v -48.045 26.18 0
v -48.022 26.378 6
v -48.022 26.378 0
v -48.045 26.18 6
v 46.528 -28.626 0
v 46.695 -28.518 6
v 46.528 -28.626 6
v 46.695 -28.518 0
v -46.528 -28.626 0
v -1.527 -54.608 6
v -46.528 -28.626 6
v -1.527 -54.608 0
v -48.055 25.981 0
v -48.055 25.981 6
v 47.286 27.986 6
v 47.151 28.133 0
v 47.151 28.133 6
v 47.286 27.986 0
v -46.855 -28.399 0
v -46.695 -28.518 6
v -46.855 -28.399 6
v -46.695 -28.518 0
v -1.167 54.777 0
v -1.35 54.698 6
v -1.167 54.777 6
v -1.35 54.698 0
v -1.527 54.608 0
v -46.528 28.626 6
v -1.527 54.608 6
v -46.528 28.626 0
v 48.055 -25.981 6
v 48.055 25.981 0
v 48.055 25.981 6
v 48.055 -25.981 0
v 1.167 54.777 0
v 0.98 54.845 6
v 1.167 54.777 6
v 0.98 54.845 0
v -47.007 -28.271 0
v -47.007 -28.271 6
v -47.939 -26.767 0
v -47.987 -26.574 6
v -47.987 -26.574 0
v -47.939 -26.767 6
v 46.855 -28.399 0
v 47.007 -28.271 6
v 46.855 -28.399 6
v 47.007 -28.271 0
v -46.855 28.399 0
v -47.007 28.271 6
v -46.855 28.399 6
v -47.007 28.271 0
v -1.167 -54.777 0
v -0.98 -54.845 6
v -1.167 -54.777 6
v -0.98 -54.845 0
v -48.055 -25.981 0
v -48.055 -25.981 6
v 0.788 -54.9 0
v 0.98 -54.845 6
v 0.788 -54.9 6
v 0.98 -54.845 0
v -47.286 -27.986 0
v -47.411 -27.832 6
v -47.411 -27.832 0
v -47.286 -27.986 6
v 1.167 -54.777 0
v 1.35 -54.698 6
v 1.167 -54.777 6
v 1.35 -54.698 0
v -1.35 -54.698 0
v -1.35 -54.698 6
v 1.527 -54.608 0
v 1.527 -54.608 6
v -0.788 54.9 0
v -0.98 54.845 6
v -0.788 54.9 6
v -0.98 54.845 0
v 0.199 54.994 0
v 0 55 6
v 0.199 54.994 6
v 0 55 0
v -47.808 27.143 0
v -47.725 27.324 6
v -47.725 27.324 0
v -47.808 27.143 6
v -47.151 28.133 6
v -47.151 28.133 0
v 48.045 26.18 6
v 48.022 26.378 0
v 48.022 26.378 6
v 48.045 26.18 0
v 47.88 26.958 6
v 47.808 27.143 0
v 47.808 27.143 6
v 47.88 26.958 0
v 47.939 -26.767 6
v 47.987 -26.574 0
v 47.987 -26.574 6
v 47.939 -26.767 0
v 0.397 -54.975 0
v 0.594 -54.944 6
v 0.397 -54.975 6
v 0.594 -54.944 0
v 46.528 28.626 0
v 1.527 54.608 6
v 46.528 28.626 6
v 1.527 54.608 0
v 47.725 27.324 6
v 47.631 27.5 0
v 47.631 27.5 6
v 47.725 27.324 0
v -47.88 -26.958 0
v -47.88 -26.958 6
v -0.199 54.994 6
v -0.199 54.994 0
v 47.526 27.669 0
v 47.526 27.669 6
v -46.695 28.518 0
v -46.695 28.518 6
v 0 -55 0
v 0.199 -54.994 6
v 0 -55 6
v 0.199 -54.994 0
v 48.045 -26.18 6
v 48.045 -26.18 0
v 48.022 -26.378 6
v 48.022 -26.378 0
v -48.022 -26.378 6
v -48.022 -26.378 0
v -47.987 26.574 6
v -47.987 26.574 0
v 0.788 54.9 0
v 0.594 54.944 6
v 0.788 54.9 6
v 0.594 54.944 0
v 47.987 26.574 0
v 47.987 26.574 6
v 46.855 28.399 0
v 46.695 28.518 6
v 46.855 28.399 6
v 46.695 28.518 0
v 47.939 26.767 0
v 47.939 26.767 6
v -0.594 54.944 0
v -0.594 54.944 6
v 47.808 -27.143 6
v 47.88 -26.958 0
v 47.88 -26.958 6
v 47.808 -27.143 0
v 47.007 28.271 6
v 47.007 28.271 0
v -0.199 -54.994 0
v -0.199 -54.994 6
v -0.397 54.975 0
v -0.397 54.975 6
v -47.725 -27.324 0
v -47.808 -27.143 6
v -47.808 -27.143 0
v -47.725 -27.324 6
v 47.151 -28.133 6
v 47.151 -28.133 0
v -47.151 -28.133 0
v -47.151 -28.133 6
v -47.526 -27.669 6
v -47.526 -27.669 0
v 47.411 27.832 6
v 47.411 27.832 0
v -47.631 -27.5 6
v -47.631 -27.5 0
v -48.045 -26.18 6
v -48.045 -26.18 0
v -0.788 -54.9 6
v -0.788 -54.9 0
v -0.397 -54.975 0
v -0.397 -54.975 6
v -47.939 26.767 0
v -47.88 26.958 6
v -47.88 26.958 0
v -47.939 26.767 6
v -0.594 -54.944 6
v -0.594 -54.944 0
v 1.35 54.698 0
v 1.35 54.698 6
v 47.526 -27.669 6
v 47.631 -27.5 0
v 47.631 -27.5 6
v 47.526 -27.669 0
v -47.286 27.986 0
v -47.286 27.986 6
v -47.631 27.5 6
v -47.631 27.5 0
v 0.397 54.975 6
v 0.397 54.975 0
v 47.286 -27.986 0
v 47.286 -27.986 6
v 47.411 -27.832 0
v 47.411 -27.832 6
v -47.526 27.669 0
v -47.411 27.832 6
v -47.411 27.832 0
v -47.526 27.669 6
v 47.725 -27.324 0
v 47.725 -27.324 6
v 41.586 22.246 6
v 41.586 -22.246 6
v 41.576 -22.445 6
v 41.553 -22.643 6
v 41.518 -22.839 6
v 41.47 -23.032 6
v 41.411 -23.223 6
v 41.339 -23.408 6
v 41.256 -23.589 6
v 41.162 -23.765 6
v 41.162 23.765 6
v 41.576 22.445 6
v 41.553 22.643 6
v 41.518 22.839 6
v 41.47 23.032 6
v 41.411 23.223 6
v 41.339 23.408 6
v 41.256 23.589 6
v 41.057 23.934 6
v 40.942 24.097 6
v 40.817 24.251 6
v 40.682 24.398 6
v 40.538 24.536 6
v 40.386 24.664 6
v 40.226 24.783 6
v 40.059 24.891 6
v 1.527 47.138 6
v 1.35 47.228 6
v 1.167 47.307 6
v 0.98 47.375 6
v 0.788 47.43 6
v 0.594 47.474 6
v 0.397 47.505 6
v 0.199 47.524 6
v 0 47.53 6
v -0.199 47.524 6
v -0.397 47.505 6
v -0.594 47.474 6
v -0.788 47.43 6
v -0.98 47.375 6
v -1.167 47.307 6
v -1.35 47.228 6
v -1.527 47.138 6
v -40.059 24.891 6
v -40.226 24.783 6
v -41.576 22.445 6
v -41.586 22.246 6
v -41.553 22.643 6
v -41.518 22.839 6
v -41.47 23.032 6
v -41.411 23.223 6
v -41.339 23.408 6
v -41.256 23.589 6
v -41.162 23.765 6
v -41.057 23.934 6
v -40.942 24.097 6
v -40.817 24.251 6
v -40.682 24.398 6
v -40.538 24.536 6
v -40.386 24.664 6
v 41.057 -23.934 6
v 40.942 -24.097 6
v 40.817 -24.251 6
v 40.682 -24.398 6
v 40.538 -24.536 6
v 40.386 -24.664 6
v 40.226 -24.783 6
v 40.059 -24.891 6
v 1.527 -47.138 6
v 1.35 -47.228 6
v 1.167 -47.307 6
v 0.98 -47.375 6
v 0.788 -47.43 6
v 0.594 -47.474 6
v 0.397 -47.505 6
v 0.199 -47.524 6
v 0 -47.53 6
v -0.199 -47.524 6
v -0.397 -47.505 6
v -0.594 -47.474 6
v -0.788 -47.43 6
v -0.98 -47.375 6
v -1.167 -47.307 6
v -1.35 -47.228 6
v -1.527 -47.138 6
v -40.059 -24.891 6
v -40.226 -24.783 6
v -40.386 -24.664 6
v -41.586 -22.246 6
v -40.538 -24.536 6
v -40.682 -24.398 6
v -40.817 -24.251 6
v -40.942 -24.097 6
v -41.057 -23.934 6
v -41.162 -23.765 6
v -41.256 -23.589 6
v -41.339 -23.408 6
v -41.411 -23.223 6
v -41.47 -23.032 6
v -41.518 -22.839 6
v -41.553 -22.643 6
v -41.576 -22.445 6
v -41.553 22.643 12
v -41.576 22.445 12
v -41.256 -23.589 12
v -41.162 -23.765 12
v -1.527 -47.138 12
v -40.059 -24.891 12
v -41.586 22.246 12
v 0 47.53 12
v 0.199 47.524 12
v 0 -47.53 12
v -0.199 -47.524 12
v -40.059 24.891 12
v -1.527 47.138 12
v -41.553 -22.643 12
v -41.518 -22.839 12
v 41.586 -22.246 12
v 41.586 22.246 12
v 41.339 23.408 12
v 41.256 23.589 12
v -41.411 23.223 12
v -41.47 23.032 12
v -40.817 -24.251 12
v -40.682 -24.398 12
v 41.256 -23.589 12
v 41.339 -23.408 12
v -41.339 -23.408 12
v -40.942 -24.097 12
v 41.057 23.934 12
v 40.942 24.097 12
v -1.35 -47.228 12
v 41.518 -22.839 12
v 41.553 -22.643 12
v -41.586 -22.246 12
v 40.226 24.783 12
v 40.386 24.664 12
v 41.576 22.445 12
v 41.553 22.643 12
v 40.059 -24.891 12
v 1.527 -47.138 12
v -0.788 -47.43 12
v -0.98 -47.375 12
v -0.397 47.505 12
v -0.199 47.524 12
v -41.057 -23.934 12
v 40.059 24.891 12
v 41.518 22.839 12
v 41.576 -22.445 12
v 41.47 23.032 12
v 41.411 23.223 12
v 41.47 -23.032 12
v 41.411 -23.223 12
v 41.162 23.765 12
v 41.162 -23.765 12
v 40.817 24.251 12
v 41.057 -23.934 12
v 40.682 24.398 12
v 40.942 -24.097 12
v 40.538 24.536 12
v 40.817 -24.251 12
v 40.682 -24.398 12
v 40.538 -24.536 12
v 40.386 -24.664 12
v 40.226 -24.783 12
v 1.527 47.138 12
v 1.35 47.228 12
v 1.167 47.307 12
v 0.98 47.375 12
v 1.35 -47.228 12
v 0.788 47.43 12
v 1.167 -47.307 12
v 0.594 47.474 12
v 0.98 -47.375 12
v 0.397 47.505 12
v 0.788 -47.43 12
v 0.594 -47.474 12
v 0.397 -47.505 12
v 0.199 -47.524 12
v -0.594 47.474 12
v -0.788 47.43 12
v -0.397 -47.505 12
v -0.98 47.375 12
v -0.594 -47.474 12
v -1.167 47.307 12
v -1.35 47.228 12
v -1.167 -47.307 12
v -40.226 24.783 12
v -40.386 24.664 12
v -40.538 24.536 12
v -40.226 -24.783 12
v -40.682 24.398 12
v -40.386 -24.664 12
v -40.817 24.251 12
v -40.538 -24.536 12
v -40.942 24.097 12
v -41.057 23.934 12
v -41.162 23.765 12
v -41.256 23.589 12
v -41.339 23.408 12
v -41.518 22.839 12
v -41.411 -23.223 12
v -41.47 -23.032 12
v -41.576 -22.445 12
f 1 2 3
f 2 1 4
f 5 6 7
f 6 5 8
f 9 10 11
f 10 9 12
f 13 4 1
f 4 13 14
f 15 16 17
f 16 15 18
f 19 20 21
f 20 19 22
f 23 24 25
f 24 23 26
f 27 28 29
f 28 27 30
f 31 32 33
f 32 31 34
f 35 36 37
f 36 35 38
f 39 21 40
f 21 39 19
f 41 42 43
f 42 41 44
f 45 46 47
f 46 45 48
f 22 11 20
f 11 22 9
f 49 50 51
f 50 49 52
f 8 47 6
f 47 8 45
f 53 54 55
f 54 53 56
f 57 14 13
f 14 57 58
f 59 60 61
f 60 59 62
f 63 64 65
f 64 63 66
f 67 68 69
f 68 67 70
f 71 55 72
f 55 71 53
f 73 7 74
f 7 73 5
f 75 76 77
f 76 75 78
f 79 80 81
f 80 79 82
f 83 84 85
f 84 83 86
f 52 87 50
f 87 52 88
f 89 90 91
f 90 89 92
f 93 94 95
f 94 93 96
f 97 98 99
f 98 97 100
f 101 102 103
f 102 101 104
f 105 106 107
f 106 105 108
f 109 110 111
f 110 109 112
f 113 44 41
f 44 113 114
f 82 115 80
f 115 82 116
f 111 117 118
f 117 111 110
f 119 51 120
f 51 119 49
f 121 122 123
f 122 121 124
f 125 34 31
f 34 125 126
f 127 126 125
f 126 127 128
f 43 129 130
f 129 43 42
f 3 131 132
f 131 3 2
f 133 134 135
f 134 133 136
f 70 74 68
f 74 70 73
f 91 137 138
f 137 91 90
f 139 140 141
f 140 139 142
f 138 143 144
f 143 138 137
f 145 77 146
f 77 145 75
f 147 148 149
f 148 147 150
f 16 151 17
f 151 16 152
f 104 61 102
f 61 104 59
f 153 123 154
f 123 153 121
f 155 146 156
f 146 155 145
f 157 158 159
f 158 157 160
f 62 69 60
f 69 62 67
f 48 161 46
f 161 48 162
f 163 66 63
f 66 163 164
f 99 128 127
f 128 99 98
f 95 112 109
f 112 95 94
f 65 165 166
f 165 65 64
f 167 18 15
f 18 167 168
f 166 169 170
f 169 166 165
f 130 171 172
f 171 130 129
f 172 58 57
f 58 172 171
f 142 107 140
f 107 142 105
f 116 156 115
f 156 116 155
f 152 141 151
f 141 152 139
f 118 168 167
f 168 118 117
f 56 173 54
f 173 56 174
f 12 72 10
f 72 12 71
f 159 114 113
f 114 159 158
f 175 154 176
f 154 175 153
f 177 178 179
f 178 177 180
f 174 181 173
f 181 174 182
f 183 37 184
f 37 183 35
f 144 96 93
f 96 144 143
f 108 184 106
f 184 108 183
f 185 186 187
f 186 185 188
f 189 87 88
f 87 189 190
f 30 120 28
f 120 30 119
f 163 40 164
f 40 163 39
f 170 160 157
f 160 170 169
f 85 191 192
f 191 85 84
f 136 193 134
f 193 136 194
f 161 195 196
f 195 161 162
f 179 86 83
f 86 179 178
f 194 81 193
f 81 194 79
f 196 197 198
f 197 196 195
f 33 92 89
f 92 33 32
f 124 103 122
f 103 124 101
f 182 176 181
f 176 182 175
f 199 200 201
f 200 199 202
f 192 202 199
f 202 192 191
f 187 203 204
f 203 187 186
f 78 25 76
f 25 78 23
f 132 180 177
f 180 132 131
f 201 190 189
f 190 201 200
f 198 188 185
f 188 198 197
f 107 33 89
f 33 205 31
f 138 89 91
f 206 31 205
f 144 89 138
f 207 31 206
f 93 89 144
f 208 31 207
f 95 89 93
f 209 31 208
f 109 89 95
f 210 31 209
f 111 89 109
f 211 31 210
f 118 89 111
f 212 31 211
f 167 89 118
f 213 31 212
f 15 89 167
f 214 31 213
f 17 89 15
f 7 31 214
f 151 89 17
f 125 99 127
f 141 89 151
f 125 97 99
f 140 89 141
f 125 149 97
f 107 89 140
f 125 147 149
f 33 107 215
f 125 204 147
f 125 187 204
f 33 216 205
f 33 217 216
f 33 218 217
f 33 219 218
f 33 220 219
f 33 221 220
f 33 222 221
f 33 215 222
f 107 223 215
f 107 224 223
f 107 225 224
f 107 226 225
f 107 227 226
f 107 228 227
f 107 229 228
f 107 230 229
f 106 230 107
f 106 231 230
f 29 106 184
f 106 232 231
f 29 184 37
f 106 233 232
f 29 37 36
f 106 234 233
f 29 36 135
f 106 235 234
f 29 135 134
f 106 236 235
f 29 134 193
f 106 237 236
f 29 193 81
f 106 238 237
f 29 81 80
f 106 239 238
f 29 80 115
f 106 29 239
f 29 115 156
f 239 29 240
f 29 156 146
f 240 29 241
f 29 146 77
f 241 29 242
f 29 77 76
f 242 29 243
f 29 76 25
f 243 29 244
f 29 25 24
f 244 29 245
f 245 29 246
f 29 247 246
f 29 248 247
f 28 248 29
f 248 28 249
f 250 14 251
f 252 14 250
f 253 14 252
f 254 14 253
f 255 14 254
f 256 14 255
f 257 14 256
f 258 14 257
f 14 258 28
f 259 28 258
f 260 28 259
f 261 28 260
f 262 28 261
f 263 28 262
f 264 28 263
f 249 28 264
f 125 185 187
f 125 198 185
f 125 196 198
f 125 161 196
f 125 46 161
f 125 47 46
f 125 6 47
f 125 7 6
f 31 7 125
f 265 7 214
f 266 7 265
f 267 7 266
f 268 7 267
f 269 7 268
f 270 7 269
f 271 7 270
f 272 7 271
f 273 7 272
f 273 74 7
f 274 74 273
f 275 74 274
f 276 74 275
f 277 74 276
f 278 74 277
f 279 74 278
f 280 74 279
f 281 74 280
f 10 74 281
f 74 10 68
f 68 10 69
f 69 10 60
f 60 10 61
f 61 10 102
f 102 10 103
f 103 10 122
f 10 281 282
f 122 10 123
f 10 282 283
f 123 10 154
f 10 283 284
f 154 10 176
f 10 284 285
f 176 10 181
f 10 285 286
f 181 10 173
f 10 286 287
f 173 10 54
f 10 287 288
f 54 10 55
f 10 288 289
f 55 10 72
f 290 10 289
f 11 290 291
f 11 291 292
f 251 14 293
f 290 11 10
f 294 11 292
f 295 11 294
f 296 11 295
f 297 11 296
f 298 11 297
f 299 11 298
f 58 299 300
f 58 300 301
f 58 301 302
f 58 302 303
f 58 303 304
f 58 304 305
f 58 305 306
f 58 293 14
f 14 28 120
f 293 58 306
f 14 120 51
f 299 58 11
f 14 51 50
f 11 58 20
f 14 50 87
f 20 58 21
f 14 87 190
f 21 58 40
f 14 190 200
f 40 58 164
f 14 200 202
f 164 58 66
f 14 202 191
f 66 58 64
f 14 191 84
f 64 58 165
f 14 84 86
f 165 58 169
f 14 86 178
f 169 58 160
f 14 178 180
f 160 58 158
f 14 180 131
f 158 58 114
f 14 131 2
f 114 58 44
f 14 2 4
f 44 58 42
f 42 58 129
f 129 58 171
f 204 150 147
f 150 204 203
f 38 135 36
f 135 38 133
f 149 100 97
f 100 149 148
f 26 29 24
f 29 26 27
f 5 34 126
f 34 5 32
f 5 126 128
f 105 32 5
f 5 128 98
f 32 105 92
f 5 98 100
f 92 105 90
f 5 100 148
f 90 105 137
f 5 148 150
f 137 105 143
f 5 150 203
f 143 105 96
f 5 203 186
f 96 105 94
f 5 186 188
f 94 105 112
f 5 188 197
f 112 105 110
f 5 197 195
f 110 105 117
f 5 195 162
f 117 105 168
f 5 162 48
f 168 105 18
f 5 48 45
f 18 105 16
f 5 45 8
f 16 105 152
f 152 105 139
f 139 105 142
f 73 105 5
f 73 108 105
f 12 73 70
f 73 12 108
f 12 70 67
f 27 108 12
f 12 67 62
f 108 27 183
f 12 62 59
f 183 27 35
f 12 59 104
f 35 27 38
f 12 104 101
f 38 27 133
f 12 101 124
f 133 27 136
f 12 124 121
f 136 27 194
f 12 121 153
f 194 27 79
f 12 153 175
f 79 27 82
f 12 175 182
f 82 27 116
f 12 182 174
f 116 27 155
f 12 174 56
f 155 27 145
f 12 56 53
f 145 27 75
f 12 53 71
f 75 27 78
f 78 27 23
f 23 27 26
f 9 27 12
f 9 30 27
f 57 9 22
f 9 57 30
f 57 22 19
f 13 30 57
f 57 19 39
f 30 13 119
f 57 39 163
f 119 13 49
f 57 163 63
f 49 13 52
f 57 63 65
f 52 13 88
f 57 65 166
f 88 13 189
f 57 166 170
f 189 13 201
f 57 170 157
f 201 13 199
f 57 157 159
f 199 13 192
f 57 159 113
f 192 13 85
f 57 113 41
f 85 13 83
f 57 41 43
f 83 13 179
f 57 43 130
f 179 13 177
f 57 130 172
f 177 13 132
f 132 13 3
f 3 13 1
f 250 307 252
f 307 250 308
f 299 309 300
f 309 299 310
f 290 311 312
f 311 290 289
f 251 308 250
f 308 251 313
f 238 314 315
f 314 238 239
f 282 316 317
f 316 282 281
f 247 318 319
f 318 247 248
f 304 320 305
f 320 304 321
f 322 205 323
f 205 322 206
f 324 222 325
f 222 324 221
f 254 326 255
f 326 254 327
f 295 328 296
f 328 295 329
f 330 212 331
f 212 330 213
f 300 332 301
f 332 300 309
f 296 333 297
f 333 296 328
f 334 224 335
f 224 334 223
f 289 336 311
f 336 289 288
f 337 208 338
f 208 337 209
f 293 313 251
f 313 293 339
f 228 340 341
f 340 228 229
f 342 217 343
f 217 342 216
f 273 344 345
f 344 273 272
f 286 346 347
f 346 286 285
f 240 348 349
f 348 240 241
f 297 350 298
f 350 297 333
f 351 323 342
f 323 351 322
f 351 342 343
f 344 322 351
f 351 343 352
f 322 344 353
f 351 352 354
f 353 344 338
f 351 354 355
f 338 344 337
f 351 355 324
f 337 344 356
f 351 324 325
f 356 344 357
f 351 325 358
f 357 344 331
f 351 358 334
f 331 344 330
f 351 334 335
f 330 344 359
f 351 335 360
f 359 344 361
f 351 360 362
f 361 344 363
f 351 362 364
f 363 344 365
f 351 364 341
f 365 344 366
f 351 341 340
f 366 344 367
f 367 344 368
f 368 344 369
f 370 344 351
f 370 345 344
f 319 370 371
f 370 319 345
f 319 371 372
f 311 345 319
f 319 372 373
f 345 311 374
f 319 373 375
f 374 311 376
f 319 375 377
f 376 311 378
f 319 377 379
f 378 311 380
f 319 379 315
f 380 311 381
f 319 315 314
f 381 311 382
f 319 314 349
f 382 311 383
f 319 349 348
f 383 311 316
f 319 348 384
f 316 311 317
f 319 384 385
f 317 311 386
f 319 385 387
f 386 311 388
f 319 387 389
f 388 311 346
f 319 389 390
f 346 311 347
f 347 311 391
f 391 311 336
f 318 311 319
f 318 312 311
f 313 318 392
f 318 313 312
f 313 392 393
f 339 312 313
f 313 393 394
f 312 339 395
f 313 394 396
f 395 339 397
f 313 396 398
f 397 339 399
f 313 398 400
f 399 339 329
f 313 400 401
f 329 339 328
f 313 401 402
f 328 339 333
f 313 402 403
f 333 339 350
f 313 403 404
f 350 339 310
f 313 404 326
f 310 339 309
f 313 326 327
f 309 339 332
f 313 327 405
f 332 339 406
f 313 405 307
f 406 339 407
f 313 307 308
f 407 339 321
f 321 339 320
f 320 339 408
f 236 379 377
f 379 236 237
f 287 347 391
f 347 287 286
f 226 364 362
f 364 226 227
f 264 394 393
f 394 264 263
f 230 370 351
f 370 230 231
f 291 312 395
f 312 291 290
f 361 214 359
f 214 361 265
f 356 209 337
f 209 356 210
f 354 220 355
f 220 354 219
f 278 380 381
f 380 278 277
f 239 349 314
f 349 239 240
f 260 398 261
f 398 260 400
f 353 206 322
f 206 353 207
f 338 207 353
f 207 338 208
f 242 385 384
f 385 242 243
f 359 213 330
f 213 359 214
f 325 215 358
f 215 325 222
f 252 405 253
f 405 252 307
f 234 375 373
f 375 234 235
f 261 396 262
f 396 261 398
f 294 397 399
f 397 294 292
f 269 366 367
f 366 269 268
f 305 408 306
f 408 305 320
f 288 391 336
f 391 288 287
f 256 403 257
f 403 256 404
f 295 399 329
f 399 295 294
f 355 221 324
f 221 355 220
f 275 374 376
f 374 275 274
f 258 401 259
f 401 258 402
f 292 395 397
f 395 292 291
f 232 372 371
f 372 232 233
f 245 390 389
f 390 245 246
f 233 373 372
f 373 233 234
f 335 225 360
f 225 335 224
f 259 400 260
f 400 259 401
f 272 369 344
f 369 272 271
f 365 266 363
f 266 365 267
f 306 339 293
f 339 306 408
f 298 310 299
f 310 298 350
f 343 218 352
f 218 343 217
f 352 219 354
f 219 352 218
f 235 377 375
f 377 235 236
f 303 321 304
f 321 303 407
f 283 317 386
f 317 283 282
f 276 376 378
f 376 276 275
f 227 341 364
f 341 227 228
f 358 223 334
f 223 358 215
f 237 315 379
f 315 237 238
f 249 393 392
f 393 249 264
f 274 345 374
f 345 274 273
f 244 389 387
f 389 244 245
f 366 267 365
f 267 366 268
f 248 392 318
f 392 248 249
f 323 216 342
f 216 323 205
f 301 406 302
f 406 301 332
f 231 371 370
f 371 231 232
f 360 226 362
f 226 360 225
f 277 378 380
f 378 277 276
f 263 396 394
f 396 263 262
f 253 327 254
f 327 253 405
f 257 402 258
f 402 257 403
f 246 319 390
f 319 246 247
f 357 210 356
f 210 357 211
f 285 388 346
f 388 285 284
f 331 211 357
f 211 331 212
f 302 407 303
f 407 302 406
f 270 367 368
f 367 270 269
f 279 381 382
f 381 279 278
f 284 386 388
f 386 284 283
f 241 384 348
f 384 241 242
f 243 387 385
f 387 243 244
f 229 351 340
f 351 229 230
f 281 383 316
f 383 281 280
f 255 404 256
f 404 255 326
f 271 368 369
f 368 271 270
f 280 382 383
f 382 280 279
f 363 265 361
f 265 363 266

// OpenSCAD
$fn = 100;

radius = 55;
rounding_radius = 3.17;
wall_thickness = 6;
height = 40;
size_under_percent = 3;
size_down_ratio = (100.0 - size_under_percent) / 100.0;

cell_count = 3;

show_tray = false;
show_lid = true;
show_lids = false;

module rounded_hexagon(radius, rounding_radius) {
    hull() {
        for(angle = [90 : 60 : 360 + 90]) {
            rotate([0, 0, angle]) {
                translate([radius - rounding_radius, 0, 0]) {
                    circle(rounding_radius);
                }
            }                
        }
    }
}

module hollow_rounded_hexagon(radius, rounding_radius, wall_thickness, hollow = true) {
    difference() {
        rounded_hexagon(radius, rounding_radius);
        if(hollow == true) rounded_hexagon(radius - wall_thickness, rounding_radius);
    }
}

module hexagon_cell(radius, rounding_radius, wall_thickness, height, hollow=true) {
    linear_extrude(height, center = true) {
        hollow_rounded_hexagon(radius, rounding_radius, wall_thickness, hollow);
    }
}

module cell(radius, rounding_radius, wall_thickness, height, hollow = true) {
    hexagon_cell(radius, rounding_radius, wall_thickness, height, hollow);
}

module cell_array(count, radius, rounding_radius, wall_thickness, height, hollow=true) {
    #cell(radius, rounding_radius, wall_thickness, height, hollow);
    
    for(angle = [0 : 60 : 60 * (count - 2)]) {
        rotate([0, 0, angle]) {
            // this is a kludge ... can't quite get the math right here
            edge_distance = radius * sqrt(3) * 0.491;
            x_offset = 2 * edge_distance - wall_thickness/2;
            translate([x_offset, 0, 0]) {
                cell(radius, rounding_radius, wall_thickness, height, hollow);
            }
        }
    }
}

module lid() {
    cell(radius, rounding_radius, wall_thickness, wall_thickness, hollow=false);
    translate([0, 0, -wall_thickness]) {
       cell((radius-wall_thickness) * size_down_ratio, rounding_radius, wall_thickness, wall_thickness, hollow=false);    
    }
}

module tray() {
    cell_array(cell_count, radius, rounding_radius, wall_thickness, height);
    translate([0, 0, -height/2 + wall_thickness/2]) {
        cell_array(cell_count, radius, rounding_radius, wall_thickness, wall_thickness, hollow=false);
    }
}

module lids() {
    rotate([180, 0, 0]) lid();
}

if(show_tray) translate([0, 0, height/2]) tray();
if(show_lid) translate([0, 0, wall_thickness/2]) rotate([180, 0, 00]) lid();
if(show_lids) lids();
    
    
        
